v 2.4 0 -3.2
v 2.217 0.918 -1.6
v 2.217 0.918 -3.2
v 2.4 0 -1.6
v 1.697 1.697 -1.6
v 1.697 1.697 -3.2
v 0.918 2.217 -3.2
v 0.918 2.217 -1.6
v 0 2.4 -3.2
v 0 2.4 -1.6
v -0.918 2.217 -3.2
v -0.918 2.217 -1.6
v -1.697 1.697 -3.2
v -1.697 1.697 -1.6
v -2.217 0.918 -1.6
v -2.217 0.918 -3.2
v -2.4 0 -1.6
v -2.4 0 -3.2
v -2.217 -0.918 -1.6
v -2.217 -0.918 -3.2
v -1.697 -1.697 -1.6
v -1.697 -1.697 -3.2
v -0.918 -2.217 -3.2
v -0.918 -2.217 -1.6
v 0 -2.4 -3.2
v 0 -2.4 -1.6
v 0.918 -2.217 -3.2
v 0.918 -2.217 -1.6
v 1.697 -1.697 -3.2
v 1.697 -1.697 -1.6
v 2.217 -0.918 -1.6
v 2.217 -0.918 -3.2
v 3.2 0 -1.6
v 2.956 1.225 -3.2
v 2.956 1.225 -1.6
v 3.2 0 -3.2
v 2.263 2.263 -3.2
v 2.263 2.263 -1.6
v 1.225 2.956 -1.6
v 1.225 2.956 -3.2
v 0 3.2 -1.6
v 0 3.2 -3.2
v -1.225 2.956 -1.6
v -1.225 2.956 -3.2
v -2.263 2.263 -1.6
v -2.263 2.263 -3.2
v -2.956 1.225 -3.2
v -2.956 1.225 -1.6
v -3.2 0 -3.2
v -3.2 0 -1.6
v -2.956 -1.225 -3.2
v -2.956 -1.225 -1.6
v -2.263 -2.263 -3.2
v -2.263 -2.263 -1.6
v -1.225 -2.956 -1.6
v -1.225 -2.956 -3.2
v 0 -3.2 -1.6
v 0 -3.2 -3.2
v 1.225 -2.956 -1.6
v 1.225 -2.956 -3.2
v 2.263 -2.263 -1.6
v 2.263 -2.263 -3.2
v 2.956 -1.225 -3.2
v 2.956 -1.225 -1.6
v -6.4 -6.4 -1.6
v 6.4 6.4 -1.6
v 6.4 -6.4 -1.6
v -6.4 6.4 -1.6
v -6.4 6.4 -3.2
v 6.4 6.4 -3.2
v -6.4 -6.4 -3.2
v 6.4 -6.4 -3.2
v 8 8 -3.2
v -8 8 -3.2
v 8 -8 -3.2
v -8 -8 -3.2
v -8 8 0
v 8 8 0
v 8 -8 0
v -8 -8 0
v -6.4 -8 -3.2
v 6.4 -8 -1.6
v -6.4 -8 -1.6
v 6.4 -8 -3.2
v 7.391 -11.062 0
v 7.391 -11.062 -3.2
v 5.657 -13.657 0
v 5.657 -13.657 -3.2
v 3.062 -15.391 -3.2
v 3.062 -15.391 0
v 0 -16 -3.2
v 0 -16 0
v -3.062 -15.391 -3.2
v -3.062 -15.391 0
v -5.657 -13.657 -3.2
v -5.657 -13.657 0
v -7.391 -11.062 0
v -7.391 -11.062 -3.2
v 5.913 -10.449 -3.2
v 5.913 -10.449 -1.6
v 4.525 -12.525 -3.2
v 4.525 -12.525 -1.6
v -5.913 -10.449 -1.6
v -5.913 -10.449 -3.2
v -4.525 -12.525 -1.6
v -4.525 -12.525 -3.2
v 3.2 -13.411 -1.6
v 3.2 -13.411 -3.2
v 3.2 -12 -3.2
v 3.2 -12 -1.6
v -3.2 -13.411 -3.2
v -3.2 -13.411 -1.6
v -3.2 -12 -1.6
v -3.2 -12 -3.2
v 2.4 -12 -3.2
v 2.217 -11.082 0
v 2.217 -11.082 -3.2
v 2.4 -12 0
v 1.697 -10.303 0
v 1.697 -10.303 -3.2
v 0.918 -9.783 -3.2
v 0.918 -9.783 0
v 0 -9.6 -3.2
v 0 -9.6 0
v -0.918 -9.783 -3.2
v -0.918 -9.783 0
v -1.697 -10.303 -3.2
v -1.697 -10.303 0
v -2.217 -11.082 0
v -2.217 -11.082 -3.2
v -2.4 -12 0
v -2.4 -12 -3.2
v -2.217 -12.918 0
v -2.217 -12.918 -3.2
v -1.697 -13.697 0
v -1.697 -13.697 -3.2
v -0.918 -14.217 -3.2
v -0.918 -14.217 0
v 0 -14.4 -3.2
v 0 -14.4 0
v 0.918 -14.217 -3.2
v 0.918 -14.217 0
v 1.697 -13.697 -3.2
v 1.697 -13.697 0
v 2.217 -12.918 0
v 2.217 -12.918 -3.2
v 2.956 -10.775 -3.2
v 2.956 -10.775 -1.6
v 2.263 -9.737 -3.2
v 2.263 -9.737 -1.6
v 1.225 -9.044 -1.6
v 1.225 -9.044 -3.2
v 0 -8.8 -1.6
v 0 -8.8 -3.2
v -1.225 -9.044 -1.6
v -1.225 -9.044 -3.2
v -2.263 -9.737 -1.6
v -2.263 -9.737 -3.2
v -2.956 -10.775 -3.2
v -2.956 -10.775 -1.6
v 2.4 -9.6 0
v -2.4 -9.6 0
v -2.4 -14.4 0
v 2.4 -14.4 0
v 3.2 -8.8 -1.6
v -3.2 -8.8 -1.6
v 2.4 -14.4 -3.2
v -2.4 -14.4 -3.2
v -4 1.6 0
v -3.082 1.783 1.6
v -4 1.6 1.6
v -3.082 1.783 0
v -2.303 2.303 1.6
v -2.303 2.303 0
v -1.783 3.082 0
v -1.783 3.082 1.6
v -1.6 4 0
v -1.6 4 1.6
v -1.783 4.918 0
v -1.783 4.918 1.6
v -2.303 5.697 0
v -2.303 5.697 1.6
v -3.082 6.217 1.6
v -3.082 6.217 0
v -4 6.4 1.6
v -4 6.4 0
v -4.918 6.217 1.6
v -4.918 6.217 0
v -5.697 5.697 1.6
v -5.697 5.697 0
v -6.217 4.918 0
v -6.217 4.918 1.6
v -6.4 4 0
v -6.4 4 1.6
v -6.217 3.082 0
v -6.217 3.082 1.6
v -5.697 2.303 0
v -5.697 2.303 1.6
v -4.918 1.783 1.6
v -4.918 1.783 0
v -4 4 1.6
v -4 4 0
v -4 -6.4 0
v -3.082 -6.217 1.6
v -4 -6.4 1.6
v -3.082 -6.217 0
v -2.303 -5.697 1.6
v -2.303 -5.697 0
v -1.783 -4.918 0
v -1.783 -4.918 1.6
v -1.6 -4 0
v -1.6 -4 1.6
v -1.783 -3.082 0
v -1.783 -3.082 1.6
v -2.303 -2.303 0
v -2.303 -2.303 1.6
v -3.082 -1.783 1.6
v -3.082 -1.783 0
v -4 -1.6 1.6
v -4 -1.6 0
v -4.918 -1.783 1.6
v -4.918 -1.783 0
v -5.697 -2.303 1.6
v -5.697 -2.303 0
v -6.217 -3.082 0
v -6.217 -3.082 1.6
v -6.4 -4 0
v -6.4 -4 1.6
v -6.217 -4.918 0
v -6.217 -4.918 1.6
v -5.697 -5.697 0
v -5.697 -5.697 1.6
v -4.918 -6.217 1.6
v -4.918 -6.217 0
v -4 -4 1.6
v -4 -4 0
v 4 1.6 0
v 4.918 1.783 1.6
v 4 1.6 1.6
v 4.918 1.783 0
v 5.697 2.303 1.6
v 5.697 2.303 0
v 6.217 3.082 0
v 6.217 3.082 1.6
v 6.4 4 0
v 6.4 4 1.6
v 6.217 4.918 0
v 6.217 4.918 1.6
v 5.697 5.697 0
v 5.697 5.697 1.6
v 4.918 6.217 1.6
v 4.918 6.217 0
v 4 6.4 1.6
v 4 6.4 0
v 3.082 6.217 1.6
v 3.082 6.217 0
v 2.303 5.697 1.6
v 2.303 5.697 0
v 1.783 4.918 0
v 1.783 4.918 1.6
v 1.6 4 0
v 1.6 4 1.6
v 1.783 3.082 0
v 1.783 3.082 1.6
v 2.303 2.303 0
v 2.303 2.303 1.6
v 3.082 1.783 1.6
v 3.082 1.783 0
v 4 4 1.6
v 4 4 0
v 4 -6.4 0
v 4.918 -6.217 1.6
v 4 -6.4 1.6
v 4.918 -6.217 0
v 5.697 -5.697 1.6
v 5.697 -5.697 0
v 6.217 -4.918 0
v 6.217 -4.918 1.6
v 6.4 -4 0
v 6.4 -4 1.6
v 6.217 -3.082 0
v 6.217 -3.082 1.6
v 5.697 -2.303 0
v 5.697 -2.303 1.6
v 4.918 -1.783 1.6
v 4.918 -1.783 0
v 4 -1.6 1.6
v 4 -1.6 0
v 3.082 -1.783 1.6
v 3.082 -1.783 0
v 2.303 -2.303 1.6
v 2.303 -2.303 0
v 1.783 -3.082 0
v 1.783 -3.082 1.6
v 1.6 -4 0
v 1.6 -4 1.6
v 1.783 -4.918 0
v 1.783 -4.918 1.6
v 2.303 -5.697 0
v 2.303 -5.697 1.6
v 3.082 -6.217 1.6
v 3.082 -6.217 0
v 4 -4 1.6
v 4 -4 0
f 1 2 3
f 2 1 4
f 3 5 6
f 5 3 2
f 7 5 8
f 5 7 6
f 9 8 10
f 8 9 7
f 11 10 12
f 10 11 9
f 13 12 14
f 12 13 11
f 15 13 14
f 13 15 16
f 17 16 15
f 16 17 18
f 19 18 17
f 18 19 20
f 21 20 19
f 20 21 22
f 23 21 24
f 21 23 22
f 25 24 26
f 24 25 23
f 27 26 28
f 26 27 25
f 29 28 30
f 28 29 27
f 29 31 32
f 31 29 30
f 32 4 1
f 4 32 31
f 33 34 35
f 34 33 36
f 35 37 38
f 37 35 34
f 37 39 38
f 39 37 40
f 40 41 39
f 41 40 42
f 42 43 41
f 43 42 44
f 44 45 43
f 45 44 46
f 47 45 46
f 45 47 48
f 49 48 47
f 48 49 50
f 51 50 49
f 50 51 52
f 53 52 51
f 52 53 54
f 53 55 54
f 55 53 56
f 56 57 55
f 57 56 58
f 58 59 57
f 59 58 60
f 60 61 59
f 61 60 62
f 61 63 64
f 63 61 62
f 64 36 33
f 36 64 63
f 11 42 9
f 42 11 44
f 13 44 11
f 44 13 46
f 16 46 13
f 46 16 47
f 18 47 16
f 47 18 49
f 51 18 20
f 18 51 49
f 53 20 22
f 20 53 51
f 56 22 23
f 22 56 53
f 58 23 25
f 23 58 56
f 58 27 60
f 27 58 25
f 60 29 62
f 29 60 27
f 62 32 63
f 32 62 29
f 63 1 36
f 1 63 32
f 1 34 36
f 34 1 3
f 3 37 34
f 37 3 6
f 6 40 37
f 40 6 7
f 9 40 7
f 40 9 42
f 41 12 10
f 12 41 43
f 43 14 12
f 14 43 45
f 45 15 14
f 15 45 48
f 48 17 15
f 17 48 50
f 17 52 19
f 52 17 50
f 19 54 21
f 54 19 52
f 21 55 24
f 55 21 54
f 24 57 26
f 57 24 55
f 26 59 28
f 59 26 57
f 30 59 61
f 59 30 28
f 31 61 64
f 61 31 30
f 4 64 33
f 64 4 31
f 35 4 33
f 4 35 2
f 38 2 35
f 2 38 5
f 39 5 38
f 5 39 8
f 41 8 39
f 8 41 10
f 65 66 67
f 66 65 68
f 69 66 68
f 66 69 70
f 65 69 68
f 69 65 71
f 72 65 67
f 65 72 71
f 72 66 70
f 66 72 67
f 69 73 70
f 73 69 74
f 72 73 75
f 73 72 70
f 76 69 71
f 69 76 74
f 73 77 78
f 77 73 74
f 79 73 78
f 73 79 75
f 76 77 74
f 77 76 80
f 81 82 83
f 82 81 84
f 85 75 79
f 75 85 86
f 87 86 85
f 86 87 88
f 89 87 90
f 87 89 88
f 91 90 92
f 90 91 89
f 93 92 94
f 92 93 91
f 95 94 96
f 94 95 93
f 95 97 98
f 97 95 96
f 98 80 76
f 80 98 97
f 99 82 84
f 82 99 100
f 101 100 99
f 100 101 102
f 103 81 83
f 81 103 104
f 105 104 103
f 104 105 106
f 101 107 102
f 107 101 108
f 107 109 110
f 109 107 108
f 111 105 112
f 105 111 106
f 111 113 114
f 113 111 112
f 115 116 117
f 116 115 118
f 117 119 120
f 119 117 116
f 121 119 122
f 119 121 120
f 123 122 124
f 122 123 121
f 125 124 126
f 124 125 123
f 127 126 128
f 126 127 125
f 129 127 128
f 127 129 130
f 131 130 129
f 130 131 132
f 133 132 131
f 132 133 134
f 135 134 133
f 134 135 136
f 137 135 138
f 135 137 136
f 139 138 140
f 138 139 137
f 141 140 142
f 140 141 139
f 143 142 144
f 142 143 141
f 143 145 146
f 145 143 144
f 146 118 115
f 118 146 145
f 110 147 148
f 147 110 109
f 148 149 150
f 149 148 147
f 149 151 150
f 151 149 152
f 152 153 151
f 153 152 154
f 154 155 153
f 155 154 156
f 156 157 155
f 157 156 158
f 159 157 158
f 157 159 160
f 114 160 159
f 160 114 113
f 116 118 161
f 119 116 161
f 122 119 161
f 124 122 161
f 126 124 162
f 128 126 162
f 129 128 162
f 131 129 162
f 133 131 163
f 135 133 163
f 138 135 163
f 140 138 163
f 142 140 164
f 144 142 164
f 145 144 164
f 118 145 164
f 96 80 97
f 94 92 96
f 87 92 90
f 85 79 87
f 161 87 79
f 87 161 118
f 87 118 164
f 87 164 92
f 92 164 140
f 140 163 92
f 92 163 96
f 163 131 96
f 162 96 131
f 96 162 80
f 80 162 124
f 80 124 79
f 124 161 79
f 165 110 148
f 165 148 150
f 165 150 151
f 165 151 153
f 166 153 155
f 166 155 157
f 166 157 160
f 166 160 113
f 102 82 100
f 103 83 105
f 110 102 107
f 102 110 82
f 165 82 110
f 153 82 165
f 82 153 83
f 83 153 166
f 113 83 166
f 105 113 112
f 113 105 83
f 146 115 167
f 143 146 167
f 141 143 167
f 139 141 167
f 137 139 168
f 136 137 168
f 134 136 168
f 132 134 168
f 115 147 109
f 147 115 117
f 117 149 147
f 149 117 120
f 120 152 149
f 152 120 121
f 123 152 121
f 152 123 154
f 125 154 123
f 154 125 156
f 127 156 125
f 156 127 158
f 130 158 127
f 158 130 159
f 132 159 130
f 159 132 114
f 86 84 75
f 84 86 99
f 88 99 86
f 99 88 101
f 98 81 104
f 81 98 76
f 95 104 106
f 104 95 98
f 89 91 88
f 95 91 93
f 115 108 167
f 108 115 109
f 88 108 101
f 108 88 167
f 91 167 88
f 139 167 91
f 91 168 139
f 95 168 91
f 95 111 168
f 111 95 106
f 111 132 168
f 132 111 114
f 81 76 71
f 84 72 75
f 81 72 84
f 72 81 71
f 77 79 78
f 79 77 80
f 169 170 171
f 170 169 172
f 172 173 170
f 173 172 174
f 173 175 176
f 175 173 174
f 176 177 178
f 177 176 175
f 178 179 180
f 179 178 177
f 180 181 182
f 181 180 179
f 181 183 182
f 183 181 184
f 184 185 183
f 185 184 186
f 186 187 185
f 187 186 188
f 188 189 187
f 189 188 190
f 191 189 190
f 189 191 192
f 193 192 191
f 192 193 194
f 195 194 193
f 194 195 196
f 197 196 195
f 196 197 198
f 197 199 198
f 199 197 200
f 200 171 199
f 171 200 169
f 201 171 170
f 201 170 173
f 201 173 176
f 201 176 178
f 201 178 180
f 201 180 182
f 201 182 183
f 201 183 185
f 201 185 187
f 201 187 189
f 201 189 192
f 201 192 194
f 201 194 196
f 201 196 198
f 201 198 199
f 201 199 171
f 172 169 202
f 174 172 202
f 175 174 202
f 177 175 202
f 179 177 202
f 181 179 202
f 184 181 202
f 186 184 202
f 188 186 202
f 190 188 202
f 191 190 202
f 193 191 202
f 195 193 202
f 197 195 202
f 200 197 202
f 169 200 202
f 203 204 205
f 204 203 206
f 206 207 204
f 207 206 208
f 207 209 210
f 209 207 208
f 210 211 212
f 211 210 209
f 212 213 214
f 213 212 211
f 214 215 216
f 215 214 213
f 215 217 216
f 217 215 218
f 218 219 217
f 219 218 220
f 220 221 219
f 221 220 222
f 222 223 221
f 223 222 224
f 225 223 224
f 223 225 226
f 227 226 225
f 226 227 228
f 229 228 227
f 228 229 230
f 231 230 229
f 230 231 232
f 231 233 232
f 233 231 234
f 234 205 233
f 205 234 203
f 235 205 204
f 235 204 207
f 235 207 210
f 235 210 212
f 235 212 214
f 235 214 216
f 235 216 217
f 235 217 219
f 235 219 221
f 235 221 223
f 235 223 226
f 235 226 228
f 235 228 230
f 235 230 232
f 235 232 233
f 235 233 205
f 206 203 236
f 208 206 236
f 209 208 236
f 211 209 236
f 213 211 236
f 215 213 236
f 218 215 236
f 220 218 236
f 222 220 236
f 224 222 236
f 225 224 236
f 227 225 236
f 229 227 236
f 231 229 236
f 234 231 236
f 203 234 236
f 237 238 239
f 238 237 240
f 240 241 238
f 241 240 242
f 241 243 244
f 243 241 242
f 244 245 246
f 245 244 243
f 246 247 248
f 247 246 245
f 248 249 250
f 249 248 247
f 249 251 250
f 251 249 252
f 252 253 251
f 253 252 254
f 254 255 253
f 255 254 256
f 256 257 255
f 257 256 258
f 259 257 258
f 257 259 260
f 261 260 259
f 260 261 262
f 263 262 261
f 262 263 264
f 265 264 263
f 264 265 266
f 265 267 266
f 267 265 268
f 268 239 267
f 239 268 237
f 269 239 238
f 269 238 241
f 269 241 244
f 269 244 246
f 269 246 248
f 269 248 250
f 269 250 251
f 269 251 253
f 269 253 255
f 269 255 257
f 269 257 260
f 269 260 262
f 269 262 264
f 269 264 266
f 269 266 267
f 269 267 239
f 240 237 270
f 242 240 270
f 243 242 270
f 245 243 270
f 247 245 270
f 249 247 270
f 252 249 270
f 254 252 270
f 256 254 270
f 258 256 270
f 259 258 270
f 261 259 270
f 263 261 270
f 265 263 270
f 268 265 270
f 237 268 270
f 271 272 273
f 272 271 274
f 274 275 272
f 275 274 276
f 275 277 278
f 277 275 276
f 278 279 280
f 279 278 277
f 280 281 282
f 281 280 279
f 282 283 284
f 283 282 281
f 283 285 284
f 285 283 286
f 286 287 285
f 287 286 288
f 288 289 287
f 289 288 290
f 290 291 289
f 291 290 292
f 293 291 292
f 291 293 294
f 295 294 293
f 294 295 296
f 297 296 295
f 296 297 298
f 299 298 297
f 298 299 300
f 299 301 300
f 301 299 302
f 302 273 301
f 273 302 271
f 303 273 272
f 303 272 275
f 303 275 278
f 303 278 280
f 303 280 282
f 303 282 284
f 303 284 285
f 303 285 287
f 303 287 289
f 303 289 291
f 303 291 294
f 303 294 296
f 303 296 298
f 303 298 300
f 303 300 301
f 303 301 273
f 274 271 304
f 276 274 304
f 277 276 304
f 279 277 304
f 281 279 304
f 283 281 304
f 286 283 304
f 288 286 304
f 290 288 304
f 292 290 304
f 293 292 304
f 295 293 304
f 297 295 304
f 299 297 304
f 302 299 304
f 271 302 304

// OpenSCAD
use <../lib.scad>
use <48995.scad>
use <../p/stug-2x2.scad>
function ldraw_lib__3176() = [
// 0 Plate  3 x  2 with Hole
// 0 Name: 3176.dat
// 0 Author: James Jessiman
// 0 !LDRAW_ORG Part UPDATE 2026-07
// 0 !LICENSE Licensed under CC BY 4.0 : see CAreadme.txt
// 
// 0 BFC CERTIFY CCW
  [0,"BFC","CERTIFY"],
  [0,"BFC","CCW"],
// 
// 0 !CATEGORY Plate
// 0 !KEYWORDS Brickowl 796492
// 
// 0 !HISTORY 2007-06-24 [PTadmin] Header formatted for Contributor Agreement
// 0 !HISTORY 2008-07-01 [PTadmin] Official Update 2008-01
// 0 !HISTORY 2008-07-07 [guyvivan] BFCed (2004-08-07)
// 0 !HISTORY 2008-07-08 [SirBugge] Use hi-res primitives for curve (2004-08-10)
// 0 !HISTORY 2008-07-09 [Steffen] Subfiled (2004-10-30)
// 0 !HISTORY 2008-07-10 [guyvivan] Replace studs by stug2 (2004-12-30)
// 0 !HISTORY 2010-04-05 [PTadmin] Official Update 2010-01
// 0 !HISTORY 2025-09-27 [OrionP] Changed winding to CCW
// 0 !HISTORY 2025-09-29 [OrionP] Official Update 2025-09
// 0 !HISTORY 2026-04-17 [KnightOfTarenta] Replaced ~Moved to Primitive
// 0 !HISTORY 2026-07-30 [OrionP] Official Update 2026-07
// 
// 1 16 0 0 0 1 0 0 0 1 0 0 0 1 48995.dat
  [1,16,0,0,0,1,0,0,0,1,0,0,0,1, ldraw_lib__48995()],
// 1 16 0 0 0 0 0 1 0 1 0 -1 0 0 stug-2x2.dat
  [1,16,0,0,0,0,0,1,0,1,0,-1,0,0, ldraw_lib__stug_2x2()],
];
module ldraw_lib__3176(step=0, col=false, unit=2/5, alt=false, line=0.2, solid=!$preview)
    makepoly(ldraw_lib__3176(), step=step, col=col, unit=unit, alt=alt, line=line, solid=solid);
ldraw_lib__3176(line=0.2);
